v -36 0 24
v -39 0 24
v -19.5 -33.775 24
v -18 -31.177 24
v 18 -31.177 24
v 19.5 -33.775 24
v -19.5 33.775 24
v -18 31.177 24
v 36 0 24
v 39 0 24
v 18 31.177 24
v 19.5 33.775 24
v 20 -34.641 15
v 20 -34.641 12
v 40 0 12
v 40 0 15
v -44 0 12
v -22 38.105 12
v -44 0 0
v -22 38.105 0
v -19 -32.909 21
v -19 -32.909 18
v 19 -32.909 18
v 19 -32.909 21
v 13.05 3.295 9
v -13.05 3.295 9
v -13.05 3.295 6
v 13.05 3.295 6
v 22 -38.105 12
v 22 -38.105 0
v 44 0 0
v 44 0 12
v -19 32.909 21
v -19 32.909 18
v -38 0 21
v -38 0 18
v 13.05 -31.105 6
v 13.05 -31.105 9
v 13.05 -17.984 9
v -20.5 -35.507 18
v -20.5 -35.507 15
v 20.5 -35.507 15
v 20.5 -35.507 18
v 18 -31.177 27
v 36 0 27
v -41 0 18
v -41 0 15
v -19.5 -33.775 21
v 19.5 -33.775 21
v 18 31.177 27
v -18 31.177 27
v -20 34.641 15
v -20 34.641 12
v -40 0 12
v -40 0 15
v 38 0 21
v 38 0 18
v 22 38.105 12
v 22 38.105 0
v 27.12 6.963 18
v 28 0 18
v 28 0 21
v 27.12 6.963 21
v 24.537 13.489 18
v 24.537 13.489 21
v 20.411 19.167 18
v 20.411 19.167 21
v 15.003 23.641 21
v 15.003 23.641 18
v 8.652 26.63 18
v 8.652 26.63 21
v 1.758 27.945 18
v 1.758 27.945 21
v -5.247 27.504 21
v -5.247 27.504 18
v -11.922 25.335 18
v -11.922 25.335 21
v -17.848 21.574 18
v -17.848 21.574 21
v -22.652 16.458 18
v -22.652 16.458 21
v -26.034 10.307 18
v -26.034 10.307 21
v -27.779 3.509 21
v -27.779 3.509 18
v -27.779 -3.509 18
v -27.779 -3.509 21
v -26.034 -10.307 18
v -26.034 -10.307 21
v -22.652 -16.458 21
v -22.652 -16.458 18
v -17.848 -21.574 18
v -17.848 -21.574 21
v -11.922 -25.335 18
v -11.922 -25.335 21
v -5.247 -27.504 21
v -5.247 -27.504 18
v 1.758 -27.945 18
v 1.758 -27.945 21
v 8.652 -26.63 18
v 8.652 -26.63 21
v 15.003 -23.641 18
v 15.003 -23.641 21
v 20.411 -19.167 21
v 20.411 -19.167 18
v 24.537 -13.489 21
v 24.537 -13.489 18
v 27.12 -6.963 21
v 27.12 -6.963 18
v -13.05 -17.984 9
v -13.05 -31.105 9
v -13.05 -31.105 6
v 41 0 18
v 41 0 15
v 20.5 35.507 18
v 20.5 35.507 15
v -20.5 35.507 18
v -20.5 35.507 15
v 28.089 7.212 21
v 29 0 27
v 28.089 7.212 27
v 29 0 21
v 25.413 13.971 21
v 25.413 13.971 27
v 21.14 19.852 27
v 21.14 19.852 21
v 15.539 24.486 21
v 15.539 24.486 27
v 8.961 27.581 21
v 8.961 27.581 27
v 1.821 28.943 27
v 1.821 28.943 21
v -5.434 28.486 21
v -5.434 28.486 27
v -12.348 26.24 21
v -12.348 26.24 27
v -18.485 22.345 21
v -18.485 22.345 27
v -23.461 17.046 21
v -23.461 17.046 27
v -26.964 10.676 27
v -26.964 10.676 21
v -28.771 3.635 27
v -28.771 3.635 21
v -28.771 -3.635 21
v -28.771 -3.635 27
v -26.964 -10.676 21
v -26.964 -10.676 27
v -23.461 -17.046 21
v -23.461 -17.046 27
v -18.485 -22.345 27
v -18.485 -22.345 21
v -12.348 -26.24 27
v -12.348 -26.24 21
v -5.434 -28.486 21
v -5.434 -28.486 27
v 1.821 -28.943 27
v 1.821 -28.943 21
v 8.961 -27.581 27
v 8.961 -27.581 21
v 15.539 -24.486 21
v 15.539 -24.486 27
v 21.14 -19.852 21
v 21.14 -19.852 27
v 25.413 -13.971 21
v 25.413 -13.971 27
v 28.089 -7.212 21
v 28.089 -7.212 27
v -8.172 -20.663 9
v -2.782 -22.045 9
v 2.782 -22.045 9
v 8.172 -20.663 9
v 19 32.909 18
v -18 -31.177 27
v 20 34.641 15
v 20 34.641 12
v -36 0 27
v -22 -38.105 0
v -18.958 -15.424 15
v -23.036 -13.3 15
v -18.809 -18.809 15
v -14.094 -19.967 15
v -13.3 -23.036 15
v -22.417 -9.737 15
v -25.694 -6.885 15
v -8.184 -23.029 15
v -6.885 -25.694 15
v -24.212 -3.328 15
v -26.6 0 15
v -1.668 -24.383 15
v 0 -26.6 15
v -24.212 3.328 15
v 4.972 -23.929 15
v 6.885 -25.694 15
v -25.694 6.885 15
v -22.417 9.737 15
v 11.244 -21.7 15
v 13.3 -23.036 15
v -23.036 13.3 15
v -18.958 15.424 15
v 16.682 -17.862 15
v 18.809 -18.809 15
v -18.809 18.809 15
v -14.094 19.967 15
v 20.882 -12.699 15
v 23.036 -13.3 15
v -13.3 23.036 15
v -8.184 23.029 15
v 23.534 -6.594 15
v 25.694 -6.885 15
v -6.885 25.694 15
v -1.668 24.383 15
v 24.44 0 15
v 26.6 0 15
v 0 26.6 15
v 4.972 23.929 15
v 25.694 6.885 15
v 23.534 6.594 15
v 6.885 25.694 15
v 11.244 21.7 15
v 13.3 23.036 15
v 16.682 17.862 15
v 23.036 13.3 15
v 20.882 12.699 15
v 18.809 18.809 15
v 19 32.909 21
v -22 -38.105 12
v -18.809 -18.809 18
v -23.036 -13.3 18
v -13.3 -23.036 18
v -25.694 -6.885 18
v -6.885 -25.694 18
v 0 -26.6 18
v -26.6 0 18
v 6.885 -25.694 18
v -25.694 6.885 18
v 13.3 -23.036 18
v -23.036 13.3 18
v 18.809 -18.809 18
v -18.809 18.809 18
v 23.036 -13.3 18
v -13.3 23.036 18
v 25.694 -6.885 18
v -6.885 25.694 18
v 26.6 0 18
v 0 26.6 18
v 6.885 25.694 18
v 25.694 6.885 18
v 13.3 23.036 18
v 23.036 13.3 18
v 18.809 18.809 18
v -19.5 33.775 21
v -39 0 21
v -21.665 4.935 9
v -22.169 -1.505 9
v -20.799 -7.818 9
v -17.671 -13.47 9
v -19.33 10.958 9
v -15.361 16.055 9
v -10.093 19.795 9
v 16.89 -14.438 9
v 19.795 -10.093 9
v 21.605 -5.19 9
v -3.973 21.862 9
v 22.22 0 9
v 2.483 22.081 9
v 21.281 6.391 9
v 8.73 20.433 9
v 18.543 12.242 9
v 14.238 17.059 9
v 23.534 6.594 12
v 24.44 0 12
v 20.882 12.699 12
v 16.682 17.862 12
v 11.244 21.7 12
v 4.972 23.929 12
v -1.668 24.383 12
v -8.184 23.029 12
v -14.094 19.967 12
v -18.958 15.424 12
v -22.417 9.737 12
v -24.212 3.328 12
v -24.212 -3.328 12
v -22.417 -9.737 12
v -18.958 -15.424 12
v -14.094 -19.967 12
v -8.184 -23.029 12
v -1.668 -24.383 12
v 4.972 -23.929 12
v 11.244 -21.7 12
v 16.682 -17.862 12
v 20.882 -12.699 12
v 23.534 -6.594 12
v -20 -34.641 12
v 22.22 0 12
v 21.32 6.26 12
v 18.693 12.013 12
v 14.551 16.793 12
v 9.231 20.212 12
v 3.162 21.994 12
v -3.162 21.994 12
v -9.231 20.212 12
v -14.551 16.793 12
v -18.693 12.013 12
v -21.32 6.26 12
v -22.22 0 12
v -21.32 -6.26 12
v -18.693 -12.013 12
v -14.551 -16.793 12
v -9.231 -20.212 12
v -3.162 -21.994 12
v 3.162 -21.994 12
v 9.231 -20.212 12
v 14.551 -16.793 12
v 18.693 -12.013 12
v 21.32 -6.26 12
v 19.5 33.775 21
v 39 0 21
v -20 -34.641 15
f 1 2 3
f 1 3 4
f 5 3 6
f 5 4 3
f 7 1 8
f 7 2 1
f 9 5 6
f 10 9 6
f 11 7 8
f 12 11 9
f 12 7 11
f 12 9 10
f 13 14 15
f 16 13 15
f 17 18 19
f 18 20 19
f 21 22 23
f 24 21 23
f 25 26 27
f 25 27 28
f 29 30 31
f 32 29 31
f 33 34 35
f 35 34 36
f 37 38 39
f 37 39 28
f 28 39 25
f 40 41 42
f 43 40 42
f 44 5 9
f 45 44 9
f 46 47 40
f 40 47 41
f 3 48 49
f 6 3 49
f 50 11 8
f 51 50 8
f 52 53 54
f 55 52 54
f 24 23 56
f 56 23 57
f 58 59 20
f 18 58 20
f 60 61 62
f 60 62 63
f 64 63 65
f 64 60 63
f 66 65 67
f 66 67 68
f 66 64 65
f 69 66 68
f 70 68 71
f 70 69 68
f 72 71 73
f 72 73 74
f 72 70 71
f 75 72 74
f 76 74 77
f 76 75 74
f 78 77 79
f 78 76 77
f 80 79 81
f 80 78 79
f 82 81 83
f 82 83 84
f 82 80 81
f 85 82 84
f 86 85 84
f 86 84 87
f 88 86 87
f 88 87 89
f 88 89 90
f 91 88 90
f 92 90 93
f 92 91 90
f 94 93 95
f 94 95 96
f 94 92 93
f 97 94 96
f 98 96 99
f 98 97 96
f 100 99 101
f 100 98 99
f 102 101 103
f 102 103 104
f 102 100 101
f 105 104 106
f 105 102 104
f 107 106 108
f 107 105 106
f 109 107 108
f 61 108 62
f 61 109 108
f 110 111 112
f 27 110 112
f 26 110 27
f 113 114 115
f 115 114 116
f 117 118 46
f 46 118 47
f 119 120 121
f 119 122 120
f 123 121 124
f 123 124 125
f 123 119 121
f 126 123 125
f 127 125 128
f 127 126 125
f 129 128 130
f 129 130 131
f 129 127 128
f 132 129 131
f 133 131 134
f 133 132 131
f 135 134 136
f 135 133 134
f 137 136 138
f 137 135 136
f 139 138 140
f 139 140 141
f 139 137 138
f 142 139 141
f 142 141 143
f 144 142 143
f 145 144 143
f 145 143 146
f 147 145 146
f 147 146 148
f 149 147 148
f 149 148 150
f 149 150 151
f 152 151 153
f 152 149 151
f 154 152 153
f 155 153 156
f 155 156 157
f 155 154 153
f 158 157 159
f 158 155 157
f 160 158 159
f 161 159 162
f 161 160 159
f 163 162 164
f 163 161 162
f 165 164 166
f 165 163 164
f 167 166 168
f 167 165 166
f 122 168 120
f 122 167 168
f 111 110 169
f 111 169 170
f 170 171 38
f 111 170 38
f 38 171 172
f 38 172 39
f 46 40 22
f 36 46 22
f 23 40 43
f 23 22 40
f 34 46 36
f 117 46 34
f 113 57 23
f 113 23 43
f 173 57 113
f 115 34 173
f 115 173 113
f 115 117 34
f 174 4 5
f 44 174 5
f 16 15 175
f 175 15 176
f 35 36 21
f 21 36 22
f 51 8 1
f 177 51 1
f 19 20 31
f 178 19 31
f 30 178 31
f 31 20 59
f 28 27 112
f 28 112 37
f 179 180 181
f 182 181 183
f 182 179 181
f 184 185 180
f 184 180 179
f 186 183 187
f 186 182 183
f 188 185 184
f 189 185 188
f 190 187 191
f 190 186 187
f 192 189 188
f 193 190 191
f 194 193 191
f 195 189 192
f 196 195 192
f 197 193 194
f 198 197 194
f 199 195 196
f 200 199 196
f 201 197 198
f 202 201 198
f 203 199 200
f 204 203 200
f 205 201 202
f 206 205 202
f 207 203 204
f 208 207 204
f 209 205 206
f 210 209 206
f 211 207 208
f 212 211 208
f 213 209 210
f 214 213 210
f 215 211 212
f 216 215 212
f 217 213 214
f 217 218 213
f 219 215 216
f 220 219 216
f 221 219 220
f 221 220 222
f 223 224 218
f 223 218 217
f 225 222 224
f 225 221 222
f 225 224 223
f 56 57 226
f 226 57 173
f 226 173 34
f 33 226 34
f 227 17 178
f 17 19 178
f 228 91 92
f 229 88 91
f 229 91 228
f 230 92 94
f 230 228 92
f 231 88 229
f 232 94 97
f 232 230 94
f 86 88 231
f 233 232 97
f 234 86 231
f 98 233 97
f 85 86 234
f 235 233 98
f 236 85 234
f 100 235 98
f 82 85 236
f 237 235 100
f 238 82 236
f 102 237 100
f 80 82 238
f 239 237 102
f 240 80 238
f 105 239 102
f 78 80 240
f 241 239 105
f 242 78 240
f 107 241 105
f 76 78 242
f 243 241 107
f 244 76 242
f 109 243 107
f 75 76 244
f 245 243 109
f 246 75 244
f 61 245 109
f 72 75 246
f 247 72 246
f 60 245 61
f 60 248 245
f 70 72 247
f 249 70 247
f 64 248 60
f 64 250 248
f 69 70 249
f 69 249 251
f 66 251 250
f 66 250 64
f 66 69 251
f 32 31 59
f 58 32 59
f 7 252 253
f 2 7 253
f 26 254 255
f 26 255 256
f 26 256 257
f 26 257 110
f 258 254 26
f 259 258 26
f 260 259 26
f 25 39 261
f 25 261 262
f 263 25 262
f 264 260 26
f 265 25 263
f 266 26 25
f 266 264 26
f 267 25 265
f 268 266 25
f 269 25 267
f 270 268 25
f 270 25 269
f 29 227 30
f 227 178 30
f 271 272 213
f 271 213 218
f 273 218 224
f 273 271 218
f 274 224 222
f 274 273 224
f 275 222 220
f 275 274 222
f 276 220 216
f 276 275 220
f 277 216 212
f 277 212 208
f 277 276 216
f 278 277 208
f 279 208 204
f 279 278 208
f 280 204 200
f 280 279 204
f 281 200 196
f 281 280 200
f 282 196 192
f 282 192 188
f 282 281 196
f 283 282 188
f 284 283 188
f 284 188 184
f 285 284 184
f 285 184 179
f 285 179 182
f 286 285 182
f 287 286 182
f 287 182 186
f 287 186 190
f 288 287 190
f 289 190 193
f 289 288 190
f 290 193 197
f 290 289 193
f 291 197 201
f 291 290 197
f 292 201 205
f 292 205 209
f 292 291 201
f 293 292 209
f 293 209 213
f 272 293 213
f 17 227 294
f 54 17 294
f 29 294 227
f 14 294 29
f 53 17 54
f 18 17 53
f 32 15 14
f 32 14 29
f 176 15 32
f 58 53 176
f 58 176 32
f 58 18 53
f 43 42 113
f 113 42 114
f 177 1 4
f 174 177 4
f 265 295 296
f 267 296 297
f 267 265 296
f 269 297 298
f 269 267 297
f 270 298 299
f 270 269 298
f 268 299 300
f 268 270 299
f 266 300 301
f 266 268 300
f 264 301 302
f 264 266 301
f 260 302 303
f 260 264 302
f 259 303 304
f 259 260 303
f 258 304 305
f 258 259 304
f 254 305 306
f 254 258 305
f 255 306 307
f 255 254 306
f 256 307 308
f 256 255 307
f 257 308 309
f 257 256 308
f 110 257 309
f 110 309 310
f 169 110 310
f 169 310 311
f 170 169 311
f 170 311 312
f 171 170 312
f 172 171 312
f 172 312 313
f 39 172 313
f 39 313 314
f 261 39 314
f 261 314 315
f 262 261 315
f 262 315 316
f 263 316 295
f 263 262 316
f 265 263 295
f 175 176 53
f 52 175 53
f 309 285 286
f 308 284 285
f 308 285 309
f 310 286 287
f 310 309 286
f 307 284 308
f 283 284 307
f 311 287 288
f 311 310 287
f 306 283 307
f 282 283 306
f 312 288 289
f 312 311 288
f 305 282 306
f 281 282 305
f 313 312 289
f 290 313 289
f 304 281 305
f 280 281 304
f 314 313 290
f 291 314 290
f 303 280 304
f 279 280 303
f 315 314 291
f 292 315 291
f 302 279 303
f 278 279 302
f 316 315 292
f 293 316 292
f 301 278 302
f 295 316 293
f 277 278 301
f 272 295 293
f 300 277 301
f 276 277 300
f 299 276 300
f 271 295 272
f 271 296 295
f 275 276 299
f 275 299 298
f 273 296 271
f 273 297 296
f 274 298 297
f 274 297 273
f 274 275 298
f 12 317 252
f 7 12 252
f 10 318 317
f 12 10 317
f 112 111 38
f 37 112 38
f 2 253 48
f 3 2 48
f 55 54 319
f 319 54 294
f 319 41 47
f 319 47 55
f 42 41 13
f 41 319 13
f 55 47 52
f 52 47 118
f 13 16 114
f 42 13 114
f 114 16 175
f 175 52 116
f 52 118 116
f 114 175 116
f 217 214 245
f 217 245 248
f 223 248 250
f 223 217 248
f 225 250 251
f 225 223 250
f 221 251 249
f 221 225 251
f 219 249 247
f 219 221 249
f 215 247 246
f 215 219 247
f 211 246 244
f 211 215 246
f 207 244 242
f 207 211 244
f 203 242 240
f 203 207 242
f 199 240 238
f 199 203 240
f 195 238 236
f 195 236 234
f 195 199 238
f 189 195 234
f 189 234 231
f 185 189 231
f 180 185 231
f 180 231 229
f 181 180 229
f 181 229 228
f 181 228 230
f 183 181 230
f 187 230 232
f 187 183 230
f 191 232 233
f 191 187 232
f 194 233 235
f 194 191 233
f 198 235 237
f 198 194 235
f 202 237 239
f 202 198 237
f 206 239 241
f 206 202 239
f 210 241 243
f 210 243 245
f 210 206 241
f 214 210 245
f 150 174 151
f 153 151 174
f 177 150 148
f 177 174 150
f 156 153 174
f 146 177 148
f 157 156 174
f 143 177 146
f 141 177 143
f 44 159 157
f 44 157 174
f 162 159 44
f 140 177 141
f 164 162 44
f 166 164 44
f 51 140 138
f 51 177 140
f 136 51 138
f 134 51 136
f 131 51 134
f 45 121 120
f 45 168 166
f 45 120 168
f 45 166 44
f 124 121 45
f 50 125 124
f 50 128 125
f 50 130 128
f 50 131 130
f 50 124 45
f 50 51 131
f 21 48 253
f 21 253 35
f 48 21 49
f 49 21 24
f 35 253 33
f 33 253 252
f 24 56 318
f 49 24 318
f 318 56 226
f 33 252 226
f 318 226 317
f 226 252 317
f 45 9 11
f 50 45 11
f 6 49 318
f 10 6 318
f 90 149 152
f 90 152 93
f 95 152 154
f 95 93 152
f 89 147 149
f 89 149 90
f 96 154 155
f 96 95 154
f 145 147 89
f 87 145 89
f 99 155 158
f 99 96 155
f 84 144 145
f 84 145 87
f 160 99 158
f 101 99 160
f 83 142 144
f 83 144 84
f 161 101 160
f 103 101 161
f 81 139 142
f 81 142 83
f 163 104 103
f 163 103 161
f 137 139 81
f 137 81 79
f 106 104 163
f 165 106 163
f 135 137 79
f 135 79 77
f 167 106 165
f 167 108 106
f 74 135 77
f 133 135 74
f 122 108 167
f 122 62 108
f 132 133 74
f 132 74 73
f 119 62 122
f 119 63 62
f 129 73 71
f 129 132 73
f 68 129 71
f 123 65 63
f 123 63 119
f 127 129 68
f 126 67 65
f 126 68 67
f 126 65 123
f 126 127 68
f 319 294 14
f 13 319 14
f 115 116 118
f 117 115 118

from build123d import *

# Parameters (mm, degrees)
PAD_DEPTH    = 9
SKETCH001_W  = 26.1
SKETCH001_H  = 34.4
POCKET_DEPTH = 3
SKETCH002_R  = 22.22
PAD001_DEPTH = 3
SKETCH003_R  = 24.44
PAD002_DEPTH = 3
SKETCH004_R  = 26.6
PAD003_DEPTH = 3
SKETCH005_R  = 28
PAD004_DEPTH = 3
SKETCH006_R  = 29
PAD005_DEPTH = 3
SKETCH007_R  = 29
PAD006_DEPTH = 3


with BuildPart() as part:
    # Sketch → Pad (new body)
    with BuildSketch(Plane.XY):
        Polygon((44, 0), (22, 38.105118), (-22, 38.105118), (-44, 0), (-22, -38.105118), (22, -38.105118), align=None)
    extrude(amount=PAD_DEPTH)

    # Sketch001 (on Face8 of Pad) → Pocket (cut)
    with BuildSketch(Plane.XY.offset(9)):
        with Locations((0, -13.905118)):
            Rectangle(SKETCH001_W, SKETCH001_H)
    extrude(amount=-POCKET_DEPTH, mode=Mode.SUBTRACT)

    # Sketch002 (on Face5 of Pocket) → Pad001 (join)
    with BuildSketch(Plane.XY.offset(9)):
        Polygon((22, 38.105118), (-22, 38.105118), (-44, 0), (-22, -38.105118), (22, -38.105118), (44, 0), align=None)
        Circle(SKETCH002_R, mode=Mode.SUBTRACT)
    extrude(amount=PAD001_DEPTH)

    # Sketch003 (on Face14 of Pad001) → Pad002 (join)
    with BuildSketch(Plane.XY.offset(12)):
        Polygon((40, 0), (20, 34.641016), (-20, 34.641016), (-40, 0), (-20, -34.641016), (20, -34.641016), align=None)
        Circle(SKETCH003_R, mode=Mode.SUBTRACT)
    extrude(amount=PAD002_DEPTH)

    # Sketch004 (on Face21 of Pad002) → Pad003 (join)
    with BuildSketch(Plane.XY.offset(15)):
        Polygon((41, 0), (20.5, 35.507042), (-20.5, 35.507042), (-41, 0), (-20.5, -35.507042), (20.5, -35.507042), align=None)
        Circle(SKETCH004_R, mode=Mode.SUBTRACT)
    extrude(amount=PAD003_DEPTH)

    # Sketch005 (on Face28 of Pad003) → Pad004 (join)
    with BuildSketch(Plane.XY.offset(18)):
        Polygon((19, 32.908965), (-19, 32.908965), (-38, 0), (-19, -32.908965), (19, -32.908965), (38, 0), align=None)
        Circle(SKETCH005_R, mode=Mode.SUBTRACT)
    extrude(amount=PAD004_DEPTH)

    # Sketch006 (on Face35 of Pad004) → Pad005 (join)
    with BuildSketch(Plane.XY.offset(21)):
        Polygon((39, 0), (19.5, 33.774991), (-19.5, 33.774991), (-39, 0), (-19.5, -33.774991), (19.5, -33.774991), align=None)
        Circle(SKETCH006_R, mode=Mode.SUBTRACT)
    extrude(amount=PAD005_DEPTH)

    # Sketch007 (on Face42 of Pad005) → Pad006 (join)
    with BuildSketch(Plane.XY.offset(24)):
        Polygon((36, 0), (18, 31.176915), (-18, 31.176915), (-36, 0), (-18, -31.176915), (18, -31.176915), align=None)
        Circle(SKETCH007_R, mode=Mode.SUBTRACT)
    extrude(amount=PAD006_DEPTH)


solid = part.part
